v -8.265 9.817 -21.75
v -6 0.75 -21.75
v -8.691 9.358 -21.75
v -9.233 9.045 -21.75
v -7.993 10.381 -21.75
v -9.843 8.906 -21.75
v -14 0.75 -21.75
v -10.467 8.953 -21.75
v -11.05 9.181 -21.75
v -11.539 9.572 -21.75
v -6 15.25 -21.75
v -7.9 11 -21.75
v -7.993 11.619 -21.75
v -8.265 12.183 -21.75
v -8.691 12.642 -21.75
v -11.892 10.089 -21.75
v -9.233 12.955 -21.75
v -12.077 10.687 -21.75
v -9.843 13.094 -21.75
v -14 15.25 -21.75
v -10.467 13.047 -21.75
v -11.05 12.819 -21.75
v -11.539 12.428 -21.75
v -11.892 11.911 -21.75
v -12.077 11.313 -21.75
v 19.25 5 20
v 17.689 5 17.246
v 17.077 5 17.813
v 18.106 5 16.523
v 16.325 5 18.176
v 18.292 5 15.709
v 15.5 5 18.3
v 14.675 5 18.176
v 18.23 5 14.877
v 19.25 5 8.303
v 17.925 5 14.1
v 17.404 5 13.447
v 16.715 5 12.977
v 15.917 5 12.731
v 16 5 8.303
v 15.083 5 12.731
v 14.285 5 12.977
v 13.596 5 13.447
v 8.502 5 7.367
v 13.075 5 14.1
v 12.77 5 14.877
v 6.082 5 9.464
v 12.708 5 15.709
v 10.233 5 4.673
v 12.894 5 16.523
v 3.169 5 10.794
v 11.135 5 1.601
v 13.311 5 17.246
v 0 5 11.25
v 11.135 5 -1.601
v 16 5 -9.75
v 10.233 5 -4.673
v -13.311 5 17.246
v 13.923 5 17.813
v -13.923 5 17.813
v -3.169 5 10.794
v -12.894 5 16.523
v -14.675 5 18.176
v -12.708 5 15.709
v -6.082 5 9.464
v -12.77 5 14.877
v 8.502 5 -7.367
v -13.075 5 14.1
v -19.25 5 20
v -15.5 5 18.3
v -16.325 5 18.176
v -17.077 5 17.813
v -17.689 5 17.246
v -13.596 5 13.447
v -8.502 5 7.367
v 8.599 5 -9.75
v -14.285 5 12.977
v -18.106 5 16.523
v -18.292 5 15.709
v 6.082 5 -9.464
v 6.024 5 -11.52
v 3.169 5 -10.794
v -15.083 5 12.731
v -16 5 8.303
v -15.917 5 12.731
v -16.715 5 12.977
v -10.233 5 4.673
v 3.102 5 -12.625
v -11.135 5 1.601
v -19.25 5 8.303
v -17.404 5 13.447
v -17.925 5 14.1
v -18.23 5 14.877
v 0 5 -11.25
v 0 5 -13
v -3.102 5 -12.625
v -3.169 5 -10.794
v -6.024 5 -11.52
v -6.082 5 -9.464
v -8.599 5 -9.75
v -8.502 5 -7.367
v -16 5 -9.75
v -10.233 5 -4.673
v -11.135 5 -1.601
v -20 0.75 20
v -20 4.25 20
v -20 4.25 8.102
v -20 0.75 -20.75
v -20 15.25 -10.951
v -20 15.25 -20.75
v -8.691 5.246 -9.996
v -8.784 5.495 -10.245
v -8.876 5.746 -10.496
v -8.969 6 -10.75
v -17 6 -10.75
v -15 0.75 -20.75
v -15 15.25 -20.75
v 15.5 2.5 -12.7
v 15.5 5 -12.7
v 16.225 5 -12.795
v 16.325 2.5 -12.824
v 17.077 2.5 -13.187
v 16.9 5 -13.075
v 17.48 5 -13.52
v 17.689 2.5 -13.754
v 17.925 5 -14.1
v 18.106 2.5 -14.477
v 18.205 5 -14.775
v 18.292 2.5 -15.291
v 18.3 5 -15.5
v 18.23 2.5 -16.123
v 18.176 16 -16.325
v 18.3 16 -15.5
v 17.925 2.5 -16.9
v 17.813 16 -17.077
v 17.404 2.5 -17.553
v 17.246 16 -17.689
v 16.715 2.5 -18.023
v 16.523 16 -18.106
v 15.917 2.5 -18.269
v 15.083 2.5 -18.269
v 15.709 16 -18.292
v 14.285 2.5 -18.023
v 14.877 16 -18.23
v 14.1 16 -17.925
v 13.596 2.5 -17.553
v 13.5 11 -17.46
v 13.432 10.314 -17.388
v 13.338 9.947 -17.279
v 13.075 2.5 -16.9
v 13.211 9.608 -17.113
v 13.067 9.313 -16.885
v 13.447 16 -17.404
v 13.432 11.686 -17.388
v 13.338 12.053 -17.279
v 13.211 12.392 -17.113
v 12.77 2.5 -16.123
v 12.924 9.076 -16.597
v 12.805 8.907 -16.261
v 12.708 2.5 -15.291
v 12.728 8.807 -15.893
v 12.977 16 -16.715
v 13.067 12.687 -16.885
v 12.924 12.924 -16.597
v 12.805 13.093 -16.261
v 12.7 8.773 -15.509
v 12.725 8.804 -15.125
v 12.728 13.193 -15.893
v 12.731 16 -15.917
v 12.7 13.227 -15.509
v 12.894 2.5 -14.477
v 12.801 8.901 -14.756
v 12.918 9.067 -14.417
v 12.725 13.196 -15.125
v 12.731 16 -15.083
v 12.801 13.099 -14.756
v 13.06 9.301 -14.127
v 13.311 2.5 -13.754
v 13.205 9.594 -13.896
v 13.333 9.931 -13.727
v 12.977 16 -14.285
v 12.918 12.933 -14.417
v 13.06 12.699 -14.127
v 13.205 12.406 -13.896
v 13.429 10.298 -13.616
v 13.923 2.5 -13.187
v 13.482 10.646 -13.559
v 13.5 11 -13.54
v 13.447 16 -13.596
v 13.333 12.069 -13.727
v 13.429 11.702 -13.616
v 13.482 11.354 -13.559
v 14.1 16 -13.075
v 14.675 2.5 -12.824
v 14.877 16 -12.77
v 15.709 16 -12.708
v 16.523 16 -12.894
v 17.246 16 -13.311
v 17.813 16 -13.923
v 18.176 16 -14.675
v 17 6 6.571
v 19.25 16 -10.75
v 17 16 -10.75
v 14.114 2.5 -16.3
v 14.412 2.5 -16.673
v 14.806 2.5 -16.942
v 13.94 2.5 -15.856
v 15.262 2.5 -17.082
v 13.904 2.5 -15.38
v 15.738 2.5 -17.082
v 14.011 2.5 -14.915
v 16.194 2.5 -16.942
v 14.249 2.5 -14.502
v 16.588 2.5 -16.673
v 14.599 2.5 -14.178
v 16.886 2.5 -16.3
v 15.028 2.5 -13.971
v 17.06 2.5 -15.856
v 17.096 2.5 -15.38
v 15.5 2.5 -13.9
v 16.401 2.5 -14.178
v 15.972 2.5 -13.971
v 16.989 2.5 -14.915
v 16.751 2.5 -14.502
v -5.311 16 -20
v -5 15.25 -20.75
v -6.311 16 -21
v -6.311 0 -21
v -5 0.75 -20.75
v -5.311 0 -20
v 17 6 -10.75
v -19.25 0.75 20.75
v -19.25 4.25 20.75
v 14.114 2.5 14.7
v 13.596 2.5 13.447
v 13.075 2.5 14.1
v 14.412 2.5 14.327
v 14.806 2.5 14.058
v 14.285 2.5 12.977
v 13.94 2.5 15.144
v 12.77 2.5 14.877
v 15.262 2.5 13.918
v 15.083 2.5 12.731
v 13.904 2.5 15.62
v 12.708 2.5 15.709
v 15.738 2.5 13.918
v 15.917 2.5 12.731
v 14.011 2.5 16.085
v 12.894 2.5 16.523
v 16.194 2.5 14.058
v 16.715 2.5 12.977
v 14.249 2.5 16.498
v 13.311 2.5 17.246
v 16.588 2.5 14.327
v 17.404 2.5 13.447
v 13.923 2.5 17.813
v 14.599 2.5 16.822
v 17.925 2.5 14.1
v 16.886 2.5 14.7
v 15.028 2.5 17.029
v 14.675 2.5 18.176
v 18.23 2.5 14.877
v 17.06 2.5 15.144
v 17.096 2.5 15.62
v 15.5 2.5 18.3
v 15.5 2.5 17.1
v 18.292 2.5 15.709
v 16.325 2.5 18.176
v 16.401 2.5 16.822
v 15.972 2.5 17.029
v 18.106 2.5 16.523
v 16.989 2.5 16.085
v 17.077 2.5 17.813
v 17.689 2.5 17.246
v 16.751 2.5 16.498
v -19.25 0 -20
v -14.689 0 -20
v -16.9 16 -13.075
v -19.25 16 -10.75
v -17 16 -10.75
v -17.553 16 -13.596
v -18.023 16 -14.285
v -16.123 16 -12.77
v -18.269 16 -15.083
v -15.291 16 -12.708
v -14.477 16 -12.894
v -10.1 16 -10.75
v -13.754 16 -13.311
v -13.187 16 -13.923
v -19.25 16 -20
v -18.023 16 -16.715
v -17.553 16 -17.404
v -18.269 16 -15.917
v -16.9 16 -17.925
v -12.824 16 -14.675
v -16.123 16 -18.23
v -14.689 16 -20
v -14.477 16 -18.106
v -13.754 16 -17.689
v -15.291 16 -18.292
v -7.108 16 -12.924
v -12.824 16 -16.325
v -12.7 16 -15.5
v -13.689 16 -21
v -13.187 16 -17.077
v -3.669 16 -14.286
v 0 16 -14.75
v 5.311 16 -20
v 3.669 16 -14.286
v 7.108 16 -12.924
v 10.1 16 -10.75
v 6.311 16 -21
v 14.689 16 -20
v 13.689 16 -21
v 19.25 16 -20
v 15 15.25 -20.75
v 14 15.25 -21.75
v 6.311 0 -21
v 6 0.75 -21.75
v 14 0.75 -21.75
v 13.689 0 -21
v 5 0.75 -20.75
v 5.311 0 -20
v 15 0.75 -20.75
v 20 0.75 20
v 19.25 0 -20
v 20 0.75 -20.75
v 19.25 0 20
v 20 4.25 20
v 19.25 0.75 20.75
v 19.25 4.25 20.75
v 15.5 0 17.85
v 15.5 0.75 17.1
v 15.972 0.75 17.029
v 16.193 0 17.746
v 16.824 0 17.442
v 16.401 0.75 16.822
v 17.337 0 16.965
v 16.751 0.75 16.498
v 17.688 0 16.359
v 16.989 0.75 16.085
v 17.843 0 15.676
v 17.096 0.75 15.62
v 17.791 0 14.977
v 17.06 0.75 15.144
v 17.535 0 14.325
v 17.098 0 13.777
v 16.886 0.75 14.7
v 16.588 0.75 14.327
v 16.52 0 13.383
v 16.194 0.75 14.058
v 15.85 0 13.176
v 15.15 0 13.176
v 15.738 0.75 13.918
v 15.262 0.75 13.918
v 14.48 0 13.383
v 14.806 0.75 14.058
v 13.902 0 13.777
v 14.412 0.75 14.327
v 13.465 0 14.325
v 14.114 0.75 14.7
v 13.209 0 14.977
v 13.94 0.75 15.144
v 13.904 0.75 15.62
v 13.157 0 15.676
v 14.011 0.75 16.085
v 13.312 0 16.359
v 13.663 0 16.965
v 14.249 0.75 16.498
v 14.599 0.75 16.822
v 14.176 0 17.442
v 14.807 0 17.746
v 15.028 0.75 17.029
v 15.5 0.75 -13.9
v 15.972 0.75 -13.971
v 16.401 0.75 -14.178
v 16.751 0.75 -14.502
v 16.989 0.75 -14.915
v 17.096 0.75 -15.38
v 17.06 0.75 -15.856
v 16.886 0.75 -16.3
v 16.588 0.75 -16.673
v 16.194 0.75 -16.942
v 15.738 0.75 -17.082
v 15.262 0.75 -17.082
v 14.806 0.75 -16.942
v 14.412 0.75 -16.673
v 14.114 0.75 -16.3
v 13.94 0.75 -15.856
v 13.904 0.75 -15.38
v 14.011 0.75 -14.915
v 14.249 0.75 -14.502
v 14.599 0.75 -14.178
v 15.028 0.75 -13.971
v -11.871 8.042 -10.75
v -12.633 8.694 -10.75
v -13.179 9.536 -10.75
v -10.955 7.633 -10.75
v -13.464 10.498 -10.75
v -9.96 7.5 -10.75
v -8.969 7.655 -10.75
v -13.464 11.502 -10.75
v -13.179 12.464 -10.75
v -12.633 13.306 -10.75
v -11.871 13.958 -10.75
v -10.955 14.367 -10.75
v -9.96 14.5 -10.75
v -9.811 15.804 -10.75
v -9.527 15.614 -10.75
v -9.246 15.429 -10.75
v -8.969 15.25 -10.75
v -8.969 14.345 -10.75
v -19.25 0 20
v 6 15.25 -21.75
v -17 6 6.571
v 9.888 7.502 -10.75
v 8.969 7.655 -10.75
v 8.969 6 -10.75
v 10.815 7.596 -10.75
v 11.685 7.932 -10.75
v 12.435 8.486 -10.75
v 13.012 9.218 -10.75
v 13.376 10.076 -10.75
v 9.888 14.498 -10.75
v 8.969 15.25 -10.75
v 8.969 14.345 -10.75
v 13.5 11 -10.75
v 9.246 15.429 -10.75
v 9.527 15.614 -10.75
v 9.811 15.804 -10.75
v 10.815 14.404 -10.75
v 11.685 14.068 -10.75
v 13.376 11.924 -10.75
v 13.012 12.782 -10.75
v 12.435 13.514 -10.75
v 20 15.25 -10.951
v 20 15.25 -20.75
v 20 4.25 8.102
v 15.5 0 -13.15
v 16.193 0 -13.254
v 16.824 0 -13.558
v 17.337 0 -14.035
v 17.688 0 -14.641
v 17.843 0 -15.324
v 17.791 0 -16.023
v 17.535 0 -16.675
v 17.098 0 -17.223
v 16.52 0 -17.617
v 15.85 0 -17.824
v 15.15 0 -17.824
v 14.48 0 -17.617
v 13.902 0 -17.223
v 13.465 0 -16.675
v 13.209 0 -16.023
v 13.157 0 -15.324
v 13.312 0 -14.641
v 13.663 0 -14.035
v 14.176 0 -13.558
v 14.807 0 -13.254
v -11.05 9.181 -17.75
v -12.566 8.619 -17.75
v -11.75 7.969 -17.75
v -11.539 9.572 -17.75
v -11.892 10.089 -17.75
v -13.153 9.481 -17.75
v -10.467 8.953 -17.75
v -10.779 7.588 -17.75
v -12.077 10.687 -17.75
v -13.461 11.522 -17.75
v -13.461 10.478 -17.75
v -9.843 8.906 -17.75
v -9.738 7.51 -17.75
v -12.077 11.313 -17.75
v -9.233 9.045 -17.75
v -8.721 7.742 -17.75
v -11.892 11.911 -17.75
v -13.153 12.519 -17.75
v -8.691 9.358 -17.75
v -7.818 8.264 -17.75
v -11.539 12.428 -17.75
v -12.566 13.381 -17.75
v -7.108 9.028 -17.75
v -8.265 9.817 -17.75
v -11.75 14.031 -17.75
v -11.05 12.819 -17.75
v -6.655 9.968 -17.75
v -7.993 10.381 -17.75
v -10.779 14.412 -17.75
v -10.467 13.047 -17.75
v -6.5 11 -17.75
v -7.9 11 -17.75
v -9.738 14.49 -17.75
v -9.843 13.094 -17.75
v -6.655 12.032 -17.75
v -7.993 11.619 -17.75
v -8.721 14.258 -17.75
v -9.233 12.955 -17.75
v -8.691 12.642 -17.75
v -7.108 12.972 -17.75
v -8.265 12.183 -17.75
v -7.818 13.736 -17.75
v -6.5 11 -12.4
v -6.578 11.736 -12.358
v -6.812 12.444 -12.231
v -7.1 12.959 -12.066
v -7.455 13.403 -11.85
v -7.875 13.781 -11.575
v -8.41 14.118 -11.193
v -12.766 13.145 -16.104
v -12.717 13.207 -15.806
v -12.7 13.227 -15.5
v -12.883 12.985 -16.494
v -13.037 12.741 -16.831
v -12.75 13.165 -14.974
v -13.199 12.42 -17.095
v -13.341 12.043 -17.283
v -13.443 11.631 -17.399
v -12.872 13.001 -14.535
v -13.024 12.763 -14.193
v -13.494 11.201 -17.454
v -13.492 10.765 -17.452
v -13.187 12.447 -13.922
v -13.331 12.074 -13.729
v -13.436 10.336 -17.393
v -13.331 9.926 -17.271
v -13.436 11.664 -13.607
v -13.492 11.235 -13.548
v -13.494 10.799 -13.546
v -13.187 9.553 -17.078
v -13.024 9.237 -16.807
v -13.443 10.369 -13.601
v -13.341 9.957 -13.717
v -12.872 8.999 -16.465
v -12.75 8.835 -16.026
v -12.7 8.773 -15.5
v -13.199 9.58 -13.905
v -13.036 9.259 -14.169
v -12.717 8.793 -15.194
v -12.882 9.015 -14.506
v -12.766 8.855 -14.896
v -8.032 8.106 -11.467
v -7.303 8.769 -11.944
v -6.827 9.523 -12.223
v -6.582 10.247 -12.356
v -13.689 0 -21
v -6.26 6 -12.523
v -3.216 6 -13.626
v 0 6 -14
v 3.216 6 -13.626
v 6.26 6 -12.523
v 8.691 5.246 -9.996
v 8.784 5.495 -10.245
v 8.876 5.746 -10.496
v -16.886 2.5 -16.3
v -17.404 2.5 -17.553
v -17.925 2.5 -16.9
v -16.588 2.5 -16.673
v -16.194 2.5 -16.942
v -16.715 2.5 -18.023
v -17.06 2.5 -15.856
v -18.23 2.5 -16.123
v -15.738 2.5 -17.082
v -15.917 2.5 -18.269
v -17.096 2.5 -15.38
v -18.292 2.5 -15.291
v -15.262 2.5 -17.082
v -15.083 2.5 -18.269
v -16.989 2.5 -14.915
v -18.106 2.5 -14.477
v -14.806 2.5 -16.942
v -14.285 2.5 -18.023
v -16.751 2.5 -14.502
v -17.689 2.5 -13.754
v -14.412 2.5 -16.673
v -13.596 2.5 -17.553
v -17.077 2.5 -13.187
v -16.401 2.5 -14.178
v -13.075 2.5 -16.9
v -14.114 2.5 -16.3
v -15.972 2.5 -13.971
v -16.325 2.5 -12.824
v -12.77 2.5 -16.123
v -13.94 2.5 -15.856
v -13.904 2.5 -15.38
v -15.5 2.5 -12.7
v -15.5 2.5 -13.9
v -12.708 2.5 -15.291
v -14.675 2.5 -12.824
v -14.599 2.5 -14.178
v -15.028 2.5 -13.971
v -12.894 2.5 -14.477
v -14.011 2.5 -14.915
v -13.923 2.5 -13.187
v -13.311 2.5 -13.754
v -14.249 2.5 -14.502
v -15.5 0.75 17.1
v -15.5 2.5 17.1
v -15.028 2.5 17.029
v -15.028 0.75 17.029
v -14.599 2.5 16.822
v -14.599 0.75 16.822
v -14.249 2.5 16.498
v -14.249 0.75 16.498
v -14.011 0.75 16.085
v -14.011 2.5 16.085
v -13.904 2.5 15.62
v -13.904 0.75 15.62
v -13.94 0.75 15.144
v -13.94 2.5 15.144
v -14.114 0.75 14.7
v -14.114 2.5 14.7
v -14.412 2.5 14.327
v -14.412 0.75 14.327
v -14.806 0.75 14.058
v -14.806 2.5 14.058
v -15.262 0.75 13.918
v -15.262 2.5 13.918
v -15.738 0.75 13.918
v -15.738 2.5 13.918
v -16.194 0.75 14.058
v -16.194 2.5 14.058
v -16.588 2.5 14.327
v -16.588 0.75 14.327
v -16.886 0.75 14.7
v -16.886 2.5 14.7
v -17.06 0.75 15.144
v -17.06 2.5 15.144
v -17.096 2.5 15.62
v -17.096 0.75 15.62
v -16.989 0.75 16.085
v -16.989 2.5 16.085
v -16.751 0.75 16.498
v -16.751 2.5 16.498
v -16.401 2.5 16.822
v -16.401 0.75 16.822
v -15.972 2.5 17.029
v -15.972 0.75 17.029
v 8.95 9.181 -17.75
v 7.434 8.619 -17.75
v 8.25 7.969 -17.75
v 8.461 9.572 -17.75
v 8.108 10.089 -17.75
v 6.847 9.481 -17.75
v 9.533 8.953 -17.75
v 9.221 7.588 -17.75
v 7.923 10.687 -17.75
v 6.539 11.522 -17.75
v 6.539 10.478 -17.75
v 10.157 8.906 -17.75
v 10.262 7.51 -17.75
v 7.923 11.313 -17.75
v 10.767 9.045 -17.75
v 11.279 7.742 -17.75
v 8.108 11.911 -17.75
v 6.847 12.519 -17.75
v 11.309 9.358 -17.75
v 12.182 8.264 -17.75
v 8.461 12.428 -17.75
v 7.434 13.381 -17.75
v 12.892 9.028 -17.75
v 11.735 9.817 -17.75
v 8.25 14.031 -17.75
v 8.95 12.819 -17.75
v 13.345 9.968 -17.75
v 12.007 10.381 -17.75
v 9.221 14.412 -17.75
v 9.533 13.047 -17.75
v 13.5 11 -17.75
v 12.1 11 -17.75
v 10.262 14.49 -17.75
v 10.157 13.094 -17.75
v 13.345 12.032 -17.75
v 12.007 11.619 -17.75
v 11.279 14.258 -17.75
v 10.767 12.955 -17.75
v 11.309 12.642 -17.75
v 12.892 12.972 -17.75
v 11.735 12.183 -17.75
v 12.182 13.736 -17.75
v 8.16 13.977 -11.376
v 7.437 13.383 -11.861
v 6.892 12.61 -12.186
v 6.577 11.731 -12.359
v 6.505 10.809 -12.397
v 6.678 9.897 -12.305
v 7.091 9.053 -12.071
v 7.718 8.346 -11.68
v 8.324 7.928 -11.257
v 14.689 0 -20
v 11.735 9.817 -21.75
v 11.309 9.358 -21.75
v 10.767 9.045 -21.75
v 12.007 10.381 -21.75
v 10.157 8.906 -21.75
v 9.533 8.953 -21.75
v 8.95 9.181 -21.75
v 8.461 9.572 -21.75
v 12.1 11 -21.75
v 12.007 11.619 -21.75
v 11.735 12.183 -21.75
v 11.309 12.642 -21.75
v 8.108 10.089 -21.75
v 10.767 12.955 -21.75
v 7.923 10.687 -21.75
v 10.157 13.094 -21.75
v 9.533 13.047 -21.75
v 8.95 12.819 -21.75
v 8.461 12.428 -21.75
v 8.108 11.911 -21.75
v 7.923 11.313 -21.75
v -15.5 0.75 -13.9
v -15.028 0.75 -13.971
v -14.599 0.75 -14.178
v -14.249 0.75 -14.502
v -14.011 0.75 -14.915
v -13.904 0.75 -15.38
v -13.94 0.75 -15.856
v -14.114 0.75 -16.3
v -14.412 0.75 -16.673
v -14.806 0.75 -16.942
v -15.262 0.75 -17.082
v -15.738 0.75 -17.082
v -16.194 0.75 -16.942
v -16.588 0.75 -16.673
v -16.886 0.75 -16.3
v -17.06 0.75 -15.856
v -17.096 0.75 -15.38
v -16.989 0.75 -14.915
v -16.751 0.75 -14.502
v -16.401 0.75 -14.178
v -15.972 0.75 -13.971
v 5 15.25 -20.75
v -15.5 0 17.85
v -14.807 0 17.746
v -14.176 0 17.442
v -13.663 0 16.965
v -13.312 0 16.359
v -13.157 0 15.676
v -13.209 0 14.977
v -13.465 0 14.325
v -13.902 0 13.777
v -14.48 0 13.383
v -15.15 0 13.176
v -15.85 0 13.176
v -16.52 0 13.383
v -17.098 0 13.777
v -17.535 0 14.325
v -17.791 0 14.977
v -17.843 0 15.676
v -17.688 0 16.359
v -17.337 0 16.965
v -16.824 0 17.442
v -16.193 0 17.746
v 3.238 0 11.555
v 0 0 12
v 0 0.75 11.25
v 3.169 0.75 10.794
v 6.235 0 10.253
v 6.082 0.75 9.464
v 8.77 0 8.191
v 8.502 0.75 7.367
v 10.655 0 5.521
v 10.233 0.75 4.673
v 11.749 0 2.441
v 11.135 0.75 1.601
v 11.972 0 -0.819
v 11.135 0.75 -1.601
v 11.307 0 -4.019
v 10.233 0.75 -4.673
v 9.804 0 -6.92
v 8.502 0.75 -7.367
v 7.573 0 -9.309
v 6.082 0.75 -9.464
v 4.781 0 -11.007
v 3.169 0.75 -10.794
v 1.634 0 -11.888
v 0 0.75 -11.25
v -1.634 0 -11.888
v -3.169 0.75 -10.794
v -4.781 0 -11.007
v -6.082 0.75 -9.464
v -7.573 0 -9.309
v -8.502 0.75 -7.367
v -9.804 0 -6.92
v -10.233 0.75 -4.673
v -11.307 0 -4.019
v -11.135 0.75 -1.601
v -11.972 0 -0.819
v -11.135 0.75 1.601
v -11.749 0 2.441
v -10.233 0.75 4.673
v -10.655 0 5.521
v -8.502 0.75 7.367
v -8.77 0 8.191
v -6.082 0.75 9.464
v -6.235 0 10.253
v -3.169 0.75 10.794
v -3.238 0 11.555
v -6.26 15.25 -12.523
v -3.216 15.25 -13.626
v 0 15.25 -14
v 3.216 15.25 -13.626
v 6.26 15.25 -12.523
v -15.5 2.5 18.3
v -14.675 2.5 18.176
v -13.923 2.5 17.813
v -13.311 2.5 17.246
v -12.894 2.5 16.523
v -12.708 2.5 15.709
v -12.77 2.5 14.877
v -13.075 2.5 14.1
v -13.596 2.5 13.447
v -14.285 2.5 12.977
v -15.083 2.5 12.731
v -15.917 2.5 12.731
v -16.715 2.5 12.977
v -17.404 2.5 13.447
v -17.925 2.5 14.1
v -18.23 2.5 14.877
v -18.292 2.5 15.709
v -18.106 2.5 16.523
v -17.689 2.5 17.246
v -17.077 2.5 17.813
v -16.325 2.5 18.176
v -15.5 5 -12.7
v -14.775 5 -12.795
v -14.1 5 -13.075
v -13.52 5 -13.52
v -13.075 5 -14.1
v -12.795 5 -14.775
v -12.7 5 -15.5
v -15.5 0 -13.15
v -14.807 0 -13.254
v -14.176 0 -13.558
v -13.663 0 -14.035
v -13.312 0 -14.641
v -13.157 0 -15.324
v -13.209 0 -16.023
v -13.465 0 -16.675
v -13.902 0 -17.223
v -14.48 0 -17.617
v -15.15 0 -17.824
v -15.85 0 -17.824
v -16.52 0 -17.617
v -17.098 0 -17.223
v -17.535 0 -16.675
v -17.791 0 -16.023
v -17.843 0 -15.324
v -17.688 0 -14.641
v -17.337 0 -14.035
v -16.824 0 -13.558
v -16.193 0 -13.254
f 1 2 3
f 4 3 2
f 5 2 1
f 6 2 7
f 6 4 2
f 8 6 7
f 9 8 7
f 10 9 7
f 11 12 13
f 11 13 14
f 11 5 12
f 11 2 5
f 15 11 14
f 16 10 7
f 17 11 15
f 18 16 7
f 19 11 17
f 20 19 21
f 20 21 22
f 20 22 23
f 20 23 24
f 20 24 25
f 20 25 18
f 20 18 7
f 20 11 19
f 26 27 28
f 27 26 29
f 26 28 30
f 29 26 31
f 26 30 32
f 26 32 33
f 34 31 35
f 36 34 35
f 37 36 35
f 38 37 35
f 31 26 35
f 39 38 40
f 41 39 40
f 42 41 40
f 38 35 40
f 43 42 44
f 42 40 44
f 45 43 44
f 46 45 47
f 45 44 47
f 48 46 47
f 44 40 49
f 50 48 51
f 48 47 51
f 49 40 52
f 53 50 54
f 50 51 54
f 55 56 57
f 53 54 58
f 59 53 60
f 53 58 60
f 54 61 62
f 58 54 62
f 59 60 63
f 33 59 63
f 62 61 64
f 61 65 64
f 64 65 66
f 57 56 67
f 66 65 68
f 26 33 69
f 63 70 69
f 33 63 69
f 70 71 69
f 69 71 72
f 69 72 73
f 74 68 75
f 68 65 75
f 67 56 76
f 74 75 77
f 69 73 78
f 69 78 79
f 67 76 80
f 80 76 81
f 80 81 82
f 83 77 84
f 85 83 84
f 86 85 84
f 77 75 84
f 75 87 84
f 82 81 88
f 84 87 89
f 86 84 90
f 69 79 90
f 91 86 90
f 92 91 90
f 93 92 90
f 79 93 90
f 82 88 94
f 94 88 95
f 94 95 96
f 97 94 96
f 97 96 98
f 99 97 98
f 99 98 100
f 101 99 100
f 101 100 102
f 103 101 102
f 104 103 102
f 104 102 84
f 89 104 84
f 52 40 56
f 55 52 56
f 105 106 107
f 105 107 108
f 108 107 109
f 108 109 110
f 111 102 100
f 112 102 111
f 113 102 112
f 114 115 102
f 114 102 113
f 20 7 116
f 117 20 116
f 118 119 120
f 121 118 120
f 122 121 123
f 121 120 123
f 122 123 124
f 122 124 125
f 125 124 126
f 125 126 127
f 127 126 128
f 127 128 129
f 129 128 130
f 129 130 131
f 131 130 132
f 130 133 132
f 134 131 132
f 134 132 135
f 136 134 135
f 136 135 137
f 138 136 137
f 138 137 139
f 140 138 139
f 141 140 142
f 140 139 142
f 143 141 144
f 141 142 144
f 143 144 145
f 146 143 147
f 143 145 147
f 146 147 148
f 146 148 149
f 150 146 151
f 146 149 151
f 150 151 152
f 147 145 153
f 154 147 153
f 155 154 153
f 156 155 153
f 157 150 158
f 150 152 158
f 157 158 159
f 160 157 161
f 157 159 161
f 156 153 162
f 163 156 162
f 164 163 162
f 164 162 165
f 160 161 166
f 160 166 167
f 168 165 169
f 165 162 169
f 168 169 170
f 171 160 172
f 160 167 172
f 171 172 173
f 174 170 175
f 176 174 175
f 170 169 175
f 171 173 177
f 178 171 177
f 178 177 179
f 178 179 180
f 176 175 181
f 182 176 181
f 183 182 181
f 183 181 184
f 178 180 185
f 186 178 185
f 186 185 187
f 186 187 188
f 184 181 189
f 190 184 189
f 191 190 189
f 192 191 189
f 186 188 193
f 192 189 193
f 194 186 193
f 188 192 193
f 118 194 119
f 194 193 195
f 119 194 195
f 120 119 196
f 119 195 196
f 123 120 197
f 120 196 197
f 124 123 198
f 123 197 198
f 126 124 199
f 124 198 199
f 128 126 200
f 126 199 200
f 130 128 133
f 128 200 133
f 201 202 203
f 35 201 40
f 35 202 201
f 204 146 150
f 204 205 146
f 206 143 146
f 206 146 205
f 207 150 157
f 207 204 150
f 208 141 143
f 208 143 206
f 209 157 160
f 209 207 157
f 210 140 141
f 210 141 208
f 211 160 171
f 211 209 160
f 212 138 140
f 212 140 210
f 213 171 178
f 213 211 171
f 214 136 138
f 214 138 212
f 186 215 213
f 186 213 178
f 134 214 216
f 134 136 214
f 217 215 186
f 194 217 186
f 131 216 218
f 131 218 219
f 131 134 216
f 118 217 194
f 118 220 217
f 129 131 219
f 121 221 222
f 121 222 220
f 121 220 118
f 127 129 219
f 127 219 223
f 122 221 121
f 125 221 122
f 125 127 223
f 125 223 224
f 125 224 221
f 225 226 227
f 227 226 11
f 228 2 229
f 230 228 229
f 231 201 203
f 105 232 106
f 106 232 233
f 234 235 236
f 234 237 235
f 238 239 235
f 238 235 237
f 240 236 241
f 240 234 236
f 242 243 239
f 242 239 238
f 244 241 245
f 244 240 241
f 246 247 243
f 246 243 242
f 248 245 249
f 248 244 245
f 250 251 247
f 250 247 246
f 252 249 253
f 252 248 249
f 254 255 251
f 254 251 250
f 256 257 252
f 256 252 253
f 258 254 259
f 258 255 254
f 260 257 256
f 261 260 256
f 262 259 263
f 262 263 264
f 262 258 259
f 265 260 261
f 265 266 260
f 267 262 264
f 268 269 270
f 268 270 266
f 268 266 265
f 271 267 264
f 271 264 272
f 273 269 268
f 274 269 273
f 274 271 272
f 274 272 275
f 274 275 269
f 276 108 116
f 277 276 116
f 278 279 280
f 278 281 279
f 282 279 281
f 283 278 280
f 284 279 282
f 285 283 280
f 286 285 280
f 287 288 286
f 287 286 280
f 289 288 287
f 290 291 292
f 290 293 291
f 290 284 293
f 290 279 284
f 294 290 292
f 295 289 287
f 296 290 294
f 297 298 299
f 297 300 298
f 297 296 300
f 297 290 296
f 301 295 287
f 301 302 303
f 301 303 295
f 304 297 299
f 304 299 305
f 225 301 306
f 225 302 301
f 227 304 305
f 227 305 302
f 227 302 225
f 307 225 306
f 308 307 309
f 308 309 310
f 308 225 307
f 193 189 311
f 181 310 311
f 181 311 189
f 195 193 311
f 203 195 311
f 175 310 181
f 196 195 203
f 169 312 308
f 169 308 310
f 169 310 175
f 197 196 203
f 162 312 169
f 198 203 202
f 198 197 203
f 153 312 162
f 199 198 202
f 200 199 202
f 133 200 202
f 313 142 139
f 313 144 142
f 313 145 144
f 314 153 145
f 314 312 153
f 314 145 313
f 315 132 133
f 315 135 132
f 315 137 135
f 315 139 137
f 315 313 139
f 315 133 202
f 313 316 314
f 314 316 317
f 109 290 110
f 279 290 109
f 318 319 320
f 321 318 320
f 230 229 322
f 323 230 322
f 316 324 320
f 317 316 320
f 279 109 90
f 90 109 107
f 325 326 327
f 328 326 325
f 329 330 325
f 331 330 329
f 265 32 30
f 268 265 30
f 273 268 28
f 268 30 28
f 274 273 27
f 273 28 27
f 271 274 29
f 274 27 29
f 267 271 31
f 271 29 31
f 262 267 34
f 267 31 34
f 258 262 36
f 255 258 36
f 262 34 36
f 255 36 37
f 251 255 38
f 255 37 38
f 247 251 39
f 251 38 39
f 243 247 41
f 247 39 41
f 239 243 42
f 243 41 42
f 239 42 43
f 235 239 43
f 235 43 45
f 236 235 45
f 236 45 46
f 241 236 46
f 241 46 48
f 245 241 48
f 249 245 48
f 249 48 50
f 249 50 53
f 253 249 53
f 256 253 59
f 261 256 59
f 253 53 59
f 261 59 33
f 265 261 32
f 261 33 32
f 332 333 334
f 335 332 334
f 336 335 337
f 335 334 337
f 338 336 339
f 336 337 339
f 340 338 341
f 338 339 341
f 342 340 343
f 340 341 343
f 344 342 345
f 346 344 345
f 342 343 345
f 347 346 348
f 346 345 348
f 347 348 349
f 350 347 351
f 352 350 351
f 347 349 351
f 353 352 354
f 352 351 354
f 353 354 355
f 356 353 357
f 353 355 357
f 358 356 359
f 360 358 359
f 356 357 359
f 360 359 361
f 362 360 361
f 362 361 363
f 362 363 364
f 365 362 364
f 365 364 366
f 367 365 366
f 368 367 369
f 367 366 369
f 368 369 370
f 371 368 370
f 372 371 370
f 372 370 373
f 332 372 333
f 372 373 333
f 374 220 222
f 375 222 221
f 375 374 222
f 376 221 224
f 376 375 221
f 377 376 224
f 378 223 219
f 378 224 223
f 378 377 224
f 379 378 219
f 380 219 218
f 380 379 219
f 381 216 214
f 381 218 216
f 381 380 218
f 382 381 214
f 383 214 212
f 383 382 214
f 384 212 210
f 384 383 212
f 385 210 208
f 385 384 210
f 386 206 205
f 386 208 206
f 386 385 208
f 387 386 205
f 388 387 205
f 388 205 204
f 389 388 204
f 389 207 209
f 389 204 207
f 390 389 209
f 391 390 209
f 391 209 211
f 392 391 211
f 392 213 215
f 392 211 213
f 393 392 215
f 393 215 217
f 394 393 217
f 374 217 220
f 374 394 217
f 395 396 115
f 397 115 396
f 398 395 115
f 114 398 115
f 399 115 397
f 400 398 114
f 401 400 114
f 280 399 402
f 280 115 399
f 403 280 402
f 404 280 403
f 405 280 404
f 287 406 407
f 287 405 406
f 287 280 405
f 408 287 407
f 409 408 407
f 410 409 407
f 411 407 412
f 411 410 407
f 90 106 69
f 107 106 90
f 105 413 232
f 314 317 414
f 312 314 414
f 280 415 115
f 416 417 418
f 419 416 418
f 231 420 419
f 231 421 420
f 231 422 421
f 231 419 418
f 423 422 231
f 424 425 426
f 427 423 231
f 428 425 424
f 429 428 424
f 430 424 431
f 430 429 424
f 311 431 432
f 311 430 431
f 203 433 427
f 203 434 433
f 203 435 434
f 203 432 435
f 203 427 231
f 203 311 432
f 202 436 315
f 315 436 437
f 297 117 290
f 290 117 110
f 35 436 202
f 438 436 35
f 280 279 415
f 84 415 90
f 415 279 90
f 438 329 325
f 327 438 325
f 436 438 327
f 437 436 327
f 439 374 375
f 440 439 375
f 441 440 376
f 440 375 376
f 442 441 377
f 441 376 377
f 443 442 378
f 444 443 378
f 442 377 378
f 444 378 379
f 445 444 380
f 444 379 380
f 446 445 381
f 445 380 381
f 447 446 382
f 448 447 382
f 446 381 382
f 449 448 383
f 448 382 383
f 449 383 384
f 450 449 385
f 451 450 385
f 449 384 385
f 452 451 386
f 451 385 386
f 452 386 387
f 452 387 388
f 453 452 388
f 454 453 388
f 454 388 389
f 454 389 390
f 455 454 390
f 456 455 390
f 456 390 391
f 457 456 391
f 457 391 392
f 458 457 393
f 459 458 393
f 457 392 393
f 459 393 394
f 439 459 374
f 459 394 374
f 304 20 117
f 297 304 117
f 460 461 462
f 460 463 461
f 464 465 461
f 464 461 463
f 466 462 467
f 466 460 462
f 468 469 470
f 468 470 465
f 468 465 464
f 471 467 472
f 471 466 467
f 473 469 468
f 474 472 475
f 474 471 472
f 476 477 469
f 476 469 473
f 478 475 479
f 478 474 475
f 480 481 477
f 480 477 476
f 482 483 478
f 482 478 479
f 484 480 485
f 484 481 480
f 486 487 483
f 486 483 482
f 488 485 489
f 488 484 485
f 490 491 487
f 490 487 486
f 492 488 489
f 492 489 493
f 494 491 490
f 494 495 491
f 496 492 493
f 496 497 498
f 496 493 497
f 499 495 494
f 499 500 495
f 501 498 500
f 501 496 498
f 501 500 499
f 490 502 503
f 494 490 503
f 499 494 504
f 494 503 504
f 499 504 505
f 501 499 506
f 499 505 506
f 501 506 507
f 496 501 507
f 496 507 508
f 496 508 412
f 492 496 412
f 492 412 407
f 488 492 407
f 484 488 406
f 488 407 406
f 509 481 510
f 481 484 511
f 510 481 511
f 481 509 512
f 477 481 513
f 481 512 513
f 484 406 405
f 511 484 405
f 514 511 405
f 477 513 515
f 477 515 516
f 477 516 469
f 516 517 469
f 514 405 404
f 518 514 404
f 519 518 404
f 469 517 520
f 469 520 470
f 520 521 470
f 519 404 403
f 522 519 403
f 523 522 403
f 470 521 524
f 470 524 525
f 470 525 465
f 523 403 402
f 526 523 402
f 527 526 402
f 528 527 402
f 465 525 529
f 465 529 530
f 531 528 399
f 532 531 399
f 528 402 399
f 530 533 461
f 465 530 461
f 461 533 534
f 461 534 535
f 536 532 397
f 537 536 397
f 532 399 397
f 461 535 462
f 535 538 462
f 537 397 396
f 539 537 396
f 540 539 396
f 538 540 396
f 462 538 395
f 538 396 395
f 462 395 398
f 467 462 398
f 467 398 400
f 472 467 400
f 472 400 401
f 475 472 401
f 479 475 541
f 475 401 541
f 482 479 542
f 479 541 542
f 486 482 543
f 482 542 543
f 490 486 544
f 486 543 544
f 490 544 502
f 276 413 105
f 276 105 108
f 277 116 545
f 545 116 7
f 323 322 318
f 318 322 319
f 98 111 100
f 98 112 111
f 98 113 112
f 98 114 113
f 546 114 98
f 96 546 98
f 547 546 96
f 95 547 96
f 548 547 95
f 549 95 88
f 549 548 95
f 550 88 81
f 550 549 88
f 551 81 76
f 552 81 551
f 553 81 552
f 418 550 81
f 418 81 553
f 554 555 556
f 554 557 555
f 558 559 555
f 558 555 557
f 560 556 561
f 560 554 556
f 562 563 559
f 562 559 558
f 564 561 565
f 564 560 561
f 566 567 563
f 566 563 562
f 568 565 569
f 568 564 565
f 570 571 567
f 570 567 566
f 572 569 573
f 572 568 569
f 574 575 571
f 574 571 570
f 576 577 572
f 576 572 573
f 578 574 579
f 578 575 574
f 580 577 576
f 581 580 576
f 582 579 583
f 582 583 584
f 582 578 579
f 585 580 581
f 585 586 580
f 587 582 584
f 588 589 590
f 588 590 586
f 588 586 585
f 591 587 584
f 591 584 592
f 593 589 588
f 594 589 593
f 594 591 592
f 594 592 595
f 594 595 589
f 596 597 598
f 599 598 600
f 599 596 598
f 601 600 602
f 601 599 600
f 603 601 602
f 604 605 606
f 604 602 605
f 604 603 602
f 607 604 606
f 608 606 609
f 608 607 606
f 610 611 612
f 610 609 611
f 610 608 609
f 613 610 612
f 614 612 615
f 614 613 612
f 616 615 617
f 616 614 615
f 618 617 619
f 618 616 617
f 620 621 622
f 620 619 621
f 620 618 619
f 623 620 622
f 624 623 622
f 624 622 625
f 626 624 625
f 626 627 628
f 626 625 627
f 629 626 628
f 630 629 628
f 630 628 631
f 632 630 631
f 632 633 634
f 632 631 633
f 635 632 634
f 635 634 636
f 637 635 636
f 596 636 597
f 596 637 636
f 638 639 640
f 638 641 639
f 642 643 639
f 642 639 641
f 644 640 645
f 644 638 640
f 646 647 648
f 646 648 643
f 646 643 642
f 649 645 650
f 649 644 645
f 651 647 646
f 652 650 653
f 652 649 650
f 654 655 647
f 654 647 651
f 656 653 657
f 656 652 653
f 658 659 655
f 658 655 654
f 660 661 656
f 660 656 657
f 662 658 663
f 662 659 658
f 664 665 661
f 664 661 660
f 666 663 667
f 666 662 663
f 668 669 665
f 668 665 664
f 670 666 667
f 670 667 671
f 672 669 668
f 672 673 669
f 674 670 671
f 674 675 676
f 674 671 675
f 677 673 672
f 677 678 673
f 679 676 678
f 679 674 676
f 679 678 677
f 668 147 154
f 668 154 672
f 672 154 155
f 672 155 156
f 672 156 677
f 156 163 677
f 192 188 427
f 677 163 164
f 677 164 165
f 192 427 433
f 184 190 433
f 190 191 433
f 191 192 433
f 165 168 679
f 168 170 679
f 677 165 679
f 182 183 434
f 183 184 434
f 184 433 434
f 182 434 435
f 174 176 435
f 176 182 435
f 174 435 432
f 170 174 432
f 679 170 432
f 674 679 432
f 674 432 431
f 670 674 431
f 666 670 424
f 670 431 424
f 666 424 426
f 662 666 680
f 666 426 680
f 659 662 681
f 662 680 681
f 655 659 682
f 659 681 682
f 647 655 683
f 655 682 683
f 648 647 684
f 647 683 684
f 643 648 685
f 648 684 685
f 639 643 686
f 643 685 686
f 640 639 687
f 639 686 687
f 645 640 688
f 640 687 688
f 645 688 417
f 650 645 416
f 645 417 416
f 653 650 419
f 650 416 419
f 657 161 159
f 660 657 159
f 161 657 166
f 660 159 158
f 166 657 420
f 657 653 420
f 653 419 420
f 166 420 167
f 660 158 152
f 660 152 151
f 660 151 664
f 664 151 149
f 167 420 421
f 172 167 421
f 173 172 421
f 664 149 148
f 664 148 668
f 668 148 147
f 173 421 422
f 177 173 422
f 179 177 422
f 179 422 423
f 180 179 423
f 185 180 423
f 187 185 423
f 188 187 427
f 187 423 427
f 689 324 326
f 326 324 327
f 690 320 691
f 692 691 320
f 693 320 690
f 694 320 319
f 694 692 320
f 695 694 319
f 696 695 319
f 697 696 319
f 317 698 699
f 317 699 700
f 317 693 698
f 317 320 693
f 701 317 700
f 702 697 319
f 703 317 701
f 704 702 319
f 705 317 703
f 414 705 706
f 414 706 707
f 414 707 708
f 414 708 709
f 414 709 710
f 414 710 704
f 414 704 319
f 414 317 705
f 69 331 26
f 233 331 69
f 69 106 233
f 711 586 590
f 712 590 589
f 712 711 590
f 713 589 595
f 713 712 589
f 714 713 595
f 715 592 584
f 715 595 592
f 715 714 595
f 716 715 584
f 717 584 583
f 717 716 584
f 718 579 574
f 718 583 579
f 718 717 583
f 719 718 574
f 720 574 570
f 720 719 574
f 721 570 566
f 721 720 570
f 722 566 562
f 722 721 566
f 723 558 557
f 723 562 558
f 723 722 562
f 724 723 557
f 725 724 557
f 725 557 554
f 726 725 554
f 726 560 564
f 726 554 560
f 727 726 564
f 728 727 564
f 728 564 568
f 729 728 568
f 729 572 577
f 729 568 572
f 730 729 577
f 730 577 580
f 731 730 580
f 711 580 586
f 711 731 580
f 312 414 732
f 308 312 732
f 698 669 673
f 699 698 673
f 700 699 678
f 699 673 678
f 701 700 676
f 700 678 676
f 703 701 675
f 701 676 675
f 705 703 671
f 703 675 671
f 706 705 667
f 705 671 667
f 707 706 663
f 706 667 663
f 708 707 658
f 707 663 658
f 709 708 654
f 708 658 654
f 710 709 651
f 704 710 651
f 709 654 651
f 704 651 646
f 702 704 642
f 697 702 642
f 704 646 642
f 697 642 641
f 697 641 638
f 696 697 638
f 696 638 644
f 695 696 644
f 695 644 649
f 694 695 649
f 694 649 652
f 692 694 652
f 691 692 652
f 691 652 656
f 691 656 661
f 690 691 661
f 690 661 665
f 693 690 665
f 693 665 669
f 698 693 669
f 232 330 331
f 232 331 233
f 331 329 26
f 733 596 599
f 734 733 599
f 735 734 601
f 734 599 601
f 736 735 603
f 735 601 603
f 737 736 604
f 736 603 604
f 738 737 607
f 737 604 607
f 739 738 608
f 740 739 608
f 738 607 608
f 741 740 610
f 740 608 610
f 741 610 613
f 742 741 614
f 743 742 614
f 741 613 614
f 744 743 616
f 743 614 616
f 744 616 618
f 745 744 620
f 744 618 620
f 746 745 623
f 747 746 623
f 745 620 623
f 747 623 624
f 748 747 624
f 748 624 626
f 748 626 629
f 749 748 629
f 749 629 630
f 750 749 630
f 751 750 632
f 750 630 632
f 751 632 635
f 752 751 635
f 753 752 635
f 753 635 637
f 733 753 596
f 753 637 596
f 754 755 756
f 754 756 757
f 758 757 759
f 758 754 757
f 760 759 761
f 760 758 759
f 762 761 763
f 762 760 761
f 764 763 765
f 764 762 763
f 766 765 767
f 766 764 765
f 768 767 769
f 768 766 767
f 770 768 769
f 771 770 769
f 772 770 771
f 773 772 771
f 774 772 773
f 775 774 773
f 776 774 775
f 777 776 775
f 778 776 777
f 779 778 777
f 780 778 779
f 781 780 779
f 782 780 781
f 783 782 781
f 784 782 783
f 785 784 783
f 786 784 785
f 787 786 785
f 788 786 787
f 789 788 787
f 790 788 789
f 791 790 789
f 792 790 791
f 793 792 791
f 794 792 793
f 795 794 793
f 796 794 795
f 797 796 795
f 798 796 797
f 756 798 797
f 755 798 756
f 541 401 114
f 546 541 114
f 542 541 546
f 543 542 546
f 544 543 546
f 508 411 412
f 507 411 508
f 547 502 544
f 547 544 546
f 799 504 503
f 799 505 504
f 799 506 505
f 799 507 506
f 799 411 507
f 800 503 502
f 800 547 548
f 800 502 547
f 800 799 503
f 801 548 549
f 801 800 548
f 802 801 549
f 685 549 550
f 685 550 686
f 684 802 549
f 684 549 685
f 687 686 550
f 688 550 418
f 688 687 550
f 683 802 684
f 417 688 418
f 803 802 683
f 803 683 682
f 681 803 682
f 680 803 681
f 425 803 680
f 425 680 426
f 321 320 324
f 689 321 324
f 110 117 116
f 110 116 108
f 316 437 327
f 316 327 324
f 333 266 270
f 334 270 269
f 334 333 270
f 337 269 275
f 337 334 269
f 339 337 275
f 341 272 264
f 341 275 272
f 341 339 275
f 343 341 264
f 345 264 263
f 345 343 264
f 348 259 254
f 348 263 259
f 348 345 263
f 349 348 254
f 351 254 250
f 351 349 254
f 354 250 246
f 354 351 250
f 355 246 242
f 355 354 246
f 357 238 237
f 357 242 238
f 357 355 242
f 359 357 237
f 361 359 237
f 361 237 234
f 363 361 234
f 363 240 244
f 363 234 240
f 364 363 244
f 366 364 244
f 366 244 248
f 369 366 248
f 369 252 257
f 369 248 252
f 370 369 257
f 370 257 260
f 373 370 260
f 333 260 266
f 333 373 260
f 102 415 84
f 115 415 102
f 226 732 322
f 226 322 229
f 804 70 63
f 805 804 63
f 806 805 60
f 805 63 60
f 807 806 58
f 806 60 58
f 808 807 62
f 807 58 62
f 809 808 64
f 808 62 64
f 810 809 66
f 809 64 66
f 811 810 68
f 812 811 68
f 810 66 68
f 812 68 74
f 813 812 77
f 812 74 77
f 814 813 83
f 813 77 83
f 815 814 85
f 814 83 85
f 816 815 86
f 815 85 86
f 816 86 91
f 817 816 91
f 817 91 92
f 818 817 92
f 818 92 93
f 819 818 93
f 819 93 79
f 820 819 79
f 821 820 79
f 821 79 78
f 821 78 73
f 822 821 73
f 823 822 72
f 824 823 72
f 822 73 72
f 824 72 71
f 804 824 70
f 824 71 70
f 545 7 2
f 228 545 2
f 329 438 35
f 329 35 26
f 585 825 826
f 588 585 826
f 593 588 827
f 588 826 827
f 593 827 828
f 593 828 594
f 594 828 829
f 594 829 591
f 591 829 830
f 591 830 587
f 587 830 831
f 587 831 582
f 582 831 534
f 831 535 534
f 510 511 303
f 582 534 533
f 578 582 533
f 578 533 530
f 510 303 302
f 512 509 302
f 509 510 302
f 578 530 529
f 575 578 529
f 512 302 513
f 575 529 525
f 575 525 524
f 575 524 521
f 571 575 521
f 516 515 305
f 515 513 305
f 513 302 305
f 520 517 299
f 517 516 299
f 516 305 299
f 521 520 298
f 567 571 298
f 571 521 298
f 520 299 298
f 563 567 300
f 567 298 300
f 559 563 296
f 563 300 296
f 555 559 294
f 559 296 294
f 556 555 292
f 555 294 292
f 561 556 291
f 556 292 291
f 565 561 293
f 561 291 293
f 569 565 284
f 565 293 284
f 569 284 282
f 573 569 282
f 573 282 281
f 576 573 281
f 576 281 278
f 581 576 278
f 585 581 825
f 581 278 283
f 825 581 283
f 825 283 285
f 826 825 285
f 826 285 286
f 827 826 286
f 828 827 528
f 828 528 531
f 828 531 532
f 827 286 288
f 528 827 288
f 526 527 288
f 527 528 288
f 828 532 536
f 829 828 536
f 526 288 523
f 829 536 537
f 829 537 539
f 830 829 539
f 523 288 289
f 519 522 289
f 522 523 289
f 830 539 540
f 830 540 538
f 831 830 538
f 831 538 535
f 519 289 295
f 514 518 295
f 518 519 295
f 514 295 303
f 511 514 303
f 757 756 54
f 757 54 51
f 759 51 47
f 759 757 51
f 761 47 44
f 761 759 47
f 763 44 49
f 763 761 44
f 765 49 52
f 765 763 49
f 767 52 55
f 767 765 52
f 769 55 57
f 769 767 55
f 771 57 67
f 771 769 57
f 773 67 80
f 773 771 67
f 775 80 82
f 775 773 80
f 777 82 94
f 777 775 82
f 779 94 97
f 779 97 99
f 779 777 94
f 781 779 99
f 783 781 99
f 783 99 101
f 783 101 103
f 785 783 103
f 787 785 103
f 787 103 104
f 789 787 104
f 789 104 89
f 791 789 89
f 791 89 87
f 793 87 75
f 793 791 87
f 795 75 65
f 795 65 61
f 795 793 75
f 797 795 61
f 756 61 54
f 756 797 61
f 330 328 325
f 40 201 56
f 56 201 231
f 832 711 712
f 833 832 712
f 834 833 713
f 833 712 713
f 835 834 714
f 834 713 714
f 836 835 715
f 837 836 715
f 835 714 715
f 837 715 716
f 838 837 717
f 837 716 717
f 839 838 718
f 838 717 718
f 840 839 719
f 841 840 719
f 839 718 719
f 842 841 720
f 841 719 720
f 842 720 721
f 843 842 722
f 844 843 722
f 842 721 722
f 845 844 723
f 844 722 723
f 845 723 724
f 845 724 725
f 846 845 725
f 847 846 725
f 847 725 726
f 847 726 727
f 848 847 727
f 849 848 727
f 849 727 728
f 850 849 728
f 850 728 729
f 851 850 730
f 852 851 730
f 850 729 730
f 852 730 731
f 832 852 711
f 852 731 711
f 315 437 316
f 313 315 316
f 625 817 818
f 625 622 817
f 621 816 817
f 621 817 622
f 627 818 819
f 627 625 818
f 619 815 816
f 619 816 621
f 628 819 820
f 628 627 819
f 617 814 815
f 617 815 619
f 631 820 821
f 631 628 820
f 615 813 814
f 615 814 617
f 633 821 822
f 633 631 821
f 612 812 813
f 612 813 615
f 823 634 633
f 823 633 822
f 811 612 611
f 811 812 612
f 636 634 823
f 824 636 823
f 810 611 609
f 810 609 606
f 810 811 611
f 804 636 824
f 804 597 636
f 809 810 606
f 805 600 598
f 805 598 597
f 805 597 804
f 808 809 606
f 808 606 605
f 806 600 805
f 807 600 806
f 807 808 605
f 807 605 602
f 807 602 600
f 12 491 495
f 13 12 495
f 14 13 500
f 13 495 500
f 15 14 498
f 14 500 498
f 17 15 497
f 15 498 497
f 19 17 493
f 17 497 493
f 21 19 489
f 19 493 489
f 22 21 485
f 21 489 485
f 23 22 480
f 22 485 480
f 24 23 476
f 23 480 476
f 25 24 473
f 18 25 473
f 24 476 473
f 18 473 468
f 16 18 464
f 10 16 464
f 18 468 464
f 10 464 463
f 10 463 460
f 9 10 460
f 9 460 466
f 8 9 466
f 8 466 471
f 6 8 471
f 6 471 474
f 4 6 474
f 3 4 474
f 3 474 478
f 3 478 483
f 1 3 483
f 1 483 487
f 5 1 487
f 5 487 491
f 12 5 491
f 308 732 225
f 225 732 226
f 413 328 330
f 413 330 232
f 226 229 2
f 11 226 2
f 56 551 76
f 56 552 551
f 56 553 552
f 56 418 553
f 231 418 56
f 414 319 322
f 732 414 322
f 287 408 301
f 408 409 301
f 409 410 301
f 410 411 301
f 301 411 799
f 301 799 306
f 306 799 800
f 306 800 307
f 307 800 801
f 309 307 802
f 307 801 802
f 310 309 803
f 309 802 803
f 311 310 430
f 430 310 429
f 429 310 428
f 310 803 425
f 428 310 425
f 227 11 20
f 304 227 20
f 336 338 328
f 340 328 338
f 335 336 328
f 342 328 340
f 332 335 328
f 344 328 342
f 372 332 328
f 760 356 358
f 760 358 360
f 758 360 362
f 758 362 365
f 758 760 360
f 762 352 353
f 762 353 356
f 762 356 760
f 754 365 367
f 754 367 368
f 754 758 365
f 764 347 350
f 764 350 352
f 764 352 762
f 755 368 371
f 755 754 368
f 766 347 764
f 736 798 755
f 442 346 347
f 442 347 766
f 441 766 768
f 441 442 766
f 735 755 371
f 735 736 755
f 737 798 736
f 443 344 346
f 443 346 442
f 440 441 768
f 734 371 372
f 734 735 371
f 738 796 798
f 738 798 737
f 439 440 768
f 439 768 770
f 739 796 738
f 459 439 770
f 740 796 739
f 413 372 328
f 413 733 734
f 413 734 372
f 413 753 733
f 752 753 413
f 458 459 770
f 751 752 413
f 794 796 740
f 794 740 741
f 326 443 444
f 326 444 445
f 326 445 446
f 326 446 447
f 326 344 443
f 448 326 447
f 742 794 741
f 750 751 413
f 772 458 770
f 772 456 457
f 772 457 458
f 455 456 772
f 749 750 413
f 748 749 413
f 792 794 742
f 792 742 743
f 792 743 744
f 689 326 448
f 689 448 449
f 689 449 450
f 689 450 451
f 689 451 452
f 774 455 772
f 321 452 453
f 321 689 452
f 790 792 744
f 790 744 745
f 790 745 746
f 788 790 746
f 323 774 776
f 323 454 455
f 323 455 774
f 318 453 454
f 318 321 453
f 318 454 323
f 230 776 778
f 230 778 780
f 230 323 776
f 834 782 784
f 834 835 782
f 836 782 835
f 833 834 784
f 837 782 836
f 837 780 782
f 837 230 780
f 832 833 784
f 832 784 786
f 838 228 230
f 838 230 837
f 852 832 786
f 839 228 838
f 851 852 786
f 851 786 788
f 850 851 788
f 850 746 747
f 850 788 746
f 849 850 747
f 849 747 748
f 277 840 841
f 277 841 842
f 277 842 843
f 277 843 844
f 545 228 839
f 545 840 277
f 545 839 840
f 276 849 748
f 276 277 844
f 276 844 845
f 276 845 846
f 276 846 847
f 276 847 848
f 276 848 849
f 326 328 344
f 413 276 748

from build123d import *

# Parameters (mm, degrees)
SKETCH1_R           = 11.25
SKETCH1_R_2         = 1.6
BOSS_EXTRUDE1_DEPTH = 5
SKETCH4_R           = 2.8
CUT_EXTRUDE1_DEPTH  = 2.5
BOSS_EXTRUDE2_START = 11
SKETCH2_R           = 2.8
BOSS_EXTRUDE2_DEPTH = 11
BOSS_EXTRUDE3_DEPTH = 3
CHAMFER2_SIZE       = 1
CUT_EXTRUDE2_REACH  = 42.599
SKETCH5_R           = 2.1
SKETCH6_R           = 3.5
CUT_EXTRUDE3_DEPTH  = 7
CHAMFER3_SIZE       = 0.75


with BuildPart() as part:
    # Sketch1 → Boss-Extrude1 (new body)
    with BuildSketch(Plane(origin=(0, 0, 0), x_dir=(1, 0, 0), z_dir=(0, 1, 0))):
        Polygon((-20, 20.75), (-15, 20.75), (-14, 21.75), (-6, 21.75), (-5, 20.75), (5, 20.75), (6, 21.75), (14, 21.75), (15, 20.75), (20, 20.75), (20, -20.75), (-20, -20.75), align=None)
        with Locations(Location((0, 0, 0), (0, 0, 270))):
            Circle(SKETCH1_R, mode=Mode.SUBTRACT)
        with Locations(Location((15.5, 15.5, 0), (0, 0, 270))):
            Circle(SKETCH1_R_2, mode=Mode.SUBTRACT)
        with Locations(Location((-15.5, 15.5, 0), (0, 0, 270))):
            Circle(SKETCH1_R_2, mode=Mode.SUBTRACT)
        with Locations(Location((-15.5, -15.5, 0), (0, 0, 270))):
            Circle(SKETCH1_R_2, mode=Mode.SUBTRACT)
        with Locations(Location((15.5, -15.5, 0), (0, 0, 270))):
            Circle(SKETCH1_R_2, mode=Mode.SUBTRACT)
    extrude(amount=BOSS_EXTRUDE1_DEPTH)

    # Sketch4 → Cut-Extrude1 (cut)
    with BuildSketch(Plane(origin=(0, 5, 0), x_dir=(1, 0, 0), z_dir=(0, 1, 0))):
        with Locations(Location((-15.5, -15.5, 0), (0, 0, 270))):
            Circle(SKETCH4_R)
        with Locations(Location((15.5, 15.5, 0), (0, 0, 270))):
            Circle(SKETCH4_R)
        with Locations(Location((-15.5, 15.5, 0), (0, 0, 270))):
            Circle(SKETCH4_R)
        with Locations(Location((15.5, -15.5, 0), (0, 0, 270))):
            Circle(SKETCH4_R)
    extrude(amount=-CUT_EXTRUDE1_DEPTH, mode=Mode.SUBTRACT)

    # Sketch2 → Boss-Extrude2 (add)
    with BuildSketch(Plane(origin=(0, 5, 0), x_dir=(1, 0, 0), z_dir=(0, 1, 0)).offset(BOSS_EXTRUDE2_START)):
        with BuildLine():
            Line((-20, 10.75), (-8.968695557, 10.75))
            ThreePointArc((-8.968695557, 10.75), (0, 14), (8.968695557, 10.75))
            Line((8.968695557, 10.75), (20, 10.75))
            Line((20, 10.75), (20, 20.75))
            Line((20, 20.75), (15, 20.75))
            Line((15, 20.75), (14, 21.75))
            Line((14, 21.75), (6, 21.75))
            Line((6, 21.75), (5, 20.75))
            Line((5, 20.75), (-5, 20.75))
            Line((-5, 20.75), (-6, 21.75))
            Line((-6, 21.75), (-14, 21.75))
            Line((-14, 21.75), (-15, 20.75))
            Line((-15, 20.75), (-20, 20.75))
            Line((-20, 20.75), (-20, 10.75))
        make_face()
        with Locations((-15.5, 15.5)):
            Circle(SKETCH2_R, mode=Mode.SUBTRACT)
        with Locations((15.5, 15.5)):
            Circle(SKETCH2_R, mode=Mode.SUBTRACT)
    extrude(amount=-BOSS_EXTRUDE2_DEPTH)

    # Sketch3 → Boss-Extrude3 (add)
    with BuildSketch(Plane(origin=(20, 0, 0), x_dir=(0, 0, -1), z_dir=(1, 0, 0))):
        Polygon((10.75, 16), (-8.302558883, 5), (10.75, 5), align=None)
    boss_extrude3 = extrude(amount=-BOSS_EXTRUDE3_DEPTH)

    # Mirror1: Boss-Extrude3 across plane
    add(boss_extrude3.mirror(Plane(origin=(0, 0, 0), x_dir=(0, 0, 1), z_dir=(1, 0, 0))))

    # Chamfer2
    chamfer2_edges = [part.edges().sort_by_distance(p)[0] for p in [
        (12.984347779, 5, -10.75),
        (17, 5, -1.223720558),
        (-17, 5, -1.223720558),
        (0, 5, -14),
        (-12.984347779, 5, -10.75),
    ]]
    chamfer(chamfer2_edges, length=CHAMFER2_SIZE)

    # Sketch5 → Cut-Extrude2 (cut, up to next)
    with BuildSketch(Plane.XY.offset(-10.75), mode=Mode.PRIVATE) as cut_extrude2_sk1:
        with Locations((-10, 11)):
            Circle(SKETCH5_R)
    cut_extrude2_tool1 = extrude(cut_extrude2_sk1.sketch, amount=-CUT_EXTRUDE2_REACH, mode=Mode.PRIVATE) & part.part
    # Sketch5 → Cut-Extrude2 (cut, up to next)
    with BuildSketch(Plane.XY.offset(-10.75), mode=Mode.PRIVATE) as cut_extrude2_sk2:
        with Locations((10, 11)):
            Circle(SKETCH5_R)
    cut_extrude2_tool2 = extrude(cut_extrude2_sk2.sketch, amount=-CUT_EXTRUDE2_REACH, mode=Mode.PRIVATE) & part.part
    add(cut_extrude2_tool1.solids().sort_by_distance((-10, 11, -10.75))[0], mode=Mode.SUBTRACT)
    add(cut_extrude2_tool2.solids().sort_by_distance((10, 11, -10.75))[0], mode=Mode.SUBTRACT)

    # Sketch6 → Cut-Extrude3 (cut)
    with BuildSketch(Plane.XY.offset(-10.75)):
        with Locations((-10, 11)):
            Circle(SKETCH6_R)
        with Locations((10, 11)):
            Circle(SKETCH6_R)
    extrude(amount=-CUT_EXTRUDE3_DEPTH, mode=Mode.SUBTRACT)

    # Chamfer3
    chamfer3_edges = [part.edges().sort_by_distance(p)[0] for p in [
        (-17.5, 0, -20.75),
        (-14.5, 0, -21.25),
        (20, 5, 14.526279442),
        (-10, 0, -21.75),
        (20, 10.5, -1.223720558),
        (-5.5, 0, -21.25),
        (0, 0, -20.75),
        (-20, 5, 14.526279442),
        (-20, 10.5, -1.223720558),
        (5.5, 0, -21.25),
        (10, 0, -21.75),
        (14.5, 0, -21.25),
        (17.5, 0, -20.75),
        (20, 0, 0),
        (0, 0, 20.75),
        (-20, 0, 0),
        (20, 2.5, 20.75),
        (-20, 2.5, 20.75),
        (0, 0, -11.25),
        (15.5, 0, -17.1),
        (-15.5, 0, -17.1),
        (-15.5, 0, 13.9),
        (15.5, 0, 13.9),
        (0, 5, 20.75),
        (0, 16, -14),
        (20, 16, -15.75),
        (17.5, 16, -20.75),
        (14.5, 16, -21.25),
        (10, 16, -21.75),
        (5.5, 16, -21.25),
        (0, 16, -20.75),
        (-5.5, 16, -21.25),
        (-10, 16, -21.75),
        (-14.5, 16, -21.25),
        (-17.5, 16, -20.75),
        (-20, 16, -15.75),
    ]]
    chamfer(chamfer3_edges, length=CHAMFER3_SIZE)


solid = part.part
